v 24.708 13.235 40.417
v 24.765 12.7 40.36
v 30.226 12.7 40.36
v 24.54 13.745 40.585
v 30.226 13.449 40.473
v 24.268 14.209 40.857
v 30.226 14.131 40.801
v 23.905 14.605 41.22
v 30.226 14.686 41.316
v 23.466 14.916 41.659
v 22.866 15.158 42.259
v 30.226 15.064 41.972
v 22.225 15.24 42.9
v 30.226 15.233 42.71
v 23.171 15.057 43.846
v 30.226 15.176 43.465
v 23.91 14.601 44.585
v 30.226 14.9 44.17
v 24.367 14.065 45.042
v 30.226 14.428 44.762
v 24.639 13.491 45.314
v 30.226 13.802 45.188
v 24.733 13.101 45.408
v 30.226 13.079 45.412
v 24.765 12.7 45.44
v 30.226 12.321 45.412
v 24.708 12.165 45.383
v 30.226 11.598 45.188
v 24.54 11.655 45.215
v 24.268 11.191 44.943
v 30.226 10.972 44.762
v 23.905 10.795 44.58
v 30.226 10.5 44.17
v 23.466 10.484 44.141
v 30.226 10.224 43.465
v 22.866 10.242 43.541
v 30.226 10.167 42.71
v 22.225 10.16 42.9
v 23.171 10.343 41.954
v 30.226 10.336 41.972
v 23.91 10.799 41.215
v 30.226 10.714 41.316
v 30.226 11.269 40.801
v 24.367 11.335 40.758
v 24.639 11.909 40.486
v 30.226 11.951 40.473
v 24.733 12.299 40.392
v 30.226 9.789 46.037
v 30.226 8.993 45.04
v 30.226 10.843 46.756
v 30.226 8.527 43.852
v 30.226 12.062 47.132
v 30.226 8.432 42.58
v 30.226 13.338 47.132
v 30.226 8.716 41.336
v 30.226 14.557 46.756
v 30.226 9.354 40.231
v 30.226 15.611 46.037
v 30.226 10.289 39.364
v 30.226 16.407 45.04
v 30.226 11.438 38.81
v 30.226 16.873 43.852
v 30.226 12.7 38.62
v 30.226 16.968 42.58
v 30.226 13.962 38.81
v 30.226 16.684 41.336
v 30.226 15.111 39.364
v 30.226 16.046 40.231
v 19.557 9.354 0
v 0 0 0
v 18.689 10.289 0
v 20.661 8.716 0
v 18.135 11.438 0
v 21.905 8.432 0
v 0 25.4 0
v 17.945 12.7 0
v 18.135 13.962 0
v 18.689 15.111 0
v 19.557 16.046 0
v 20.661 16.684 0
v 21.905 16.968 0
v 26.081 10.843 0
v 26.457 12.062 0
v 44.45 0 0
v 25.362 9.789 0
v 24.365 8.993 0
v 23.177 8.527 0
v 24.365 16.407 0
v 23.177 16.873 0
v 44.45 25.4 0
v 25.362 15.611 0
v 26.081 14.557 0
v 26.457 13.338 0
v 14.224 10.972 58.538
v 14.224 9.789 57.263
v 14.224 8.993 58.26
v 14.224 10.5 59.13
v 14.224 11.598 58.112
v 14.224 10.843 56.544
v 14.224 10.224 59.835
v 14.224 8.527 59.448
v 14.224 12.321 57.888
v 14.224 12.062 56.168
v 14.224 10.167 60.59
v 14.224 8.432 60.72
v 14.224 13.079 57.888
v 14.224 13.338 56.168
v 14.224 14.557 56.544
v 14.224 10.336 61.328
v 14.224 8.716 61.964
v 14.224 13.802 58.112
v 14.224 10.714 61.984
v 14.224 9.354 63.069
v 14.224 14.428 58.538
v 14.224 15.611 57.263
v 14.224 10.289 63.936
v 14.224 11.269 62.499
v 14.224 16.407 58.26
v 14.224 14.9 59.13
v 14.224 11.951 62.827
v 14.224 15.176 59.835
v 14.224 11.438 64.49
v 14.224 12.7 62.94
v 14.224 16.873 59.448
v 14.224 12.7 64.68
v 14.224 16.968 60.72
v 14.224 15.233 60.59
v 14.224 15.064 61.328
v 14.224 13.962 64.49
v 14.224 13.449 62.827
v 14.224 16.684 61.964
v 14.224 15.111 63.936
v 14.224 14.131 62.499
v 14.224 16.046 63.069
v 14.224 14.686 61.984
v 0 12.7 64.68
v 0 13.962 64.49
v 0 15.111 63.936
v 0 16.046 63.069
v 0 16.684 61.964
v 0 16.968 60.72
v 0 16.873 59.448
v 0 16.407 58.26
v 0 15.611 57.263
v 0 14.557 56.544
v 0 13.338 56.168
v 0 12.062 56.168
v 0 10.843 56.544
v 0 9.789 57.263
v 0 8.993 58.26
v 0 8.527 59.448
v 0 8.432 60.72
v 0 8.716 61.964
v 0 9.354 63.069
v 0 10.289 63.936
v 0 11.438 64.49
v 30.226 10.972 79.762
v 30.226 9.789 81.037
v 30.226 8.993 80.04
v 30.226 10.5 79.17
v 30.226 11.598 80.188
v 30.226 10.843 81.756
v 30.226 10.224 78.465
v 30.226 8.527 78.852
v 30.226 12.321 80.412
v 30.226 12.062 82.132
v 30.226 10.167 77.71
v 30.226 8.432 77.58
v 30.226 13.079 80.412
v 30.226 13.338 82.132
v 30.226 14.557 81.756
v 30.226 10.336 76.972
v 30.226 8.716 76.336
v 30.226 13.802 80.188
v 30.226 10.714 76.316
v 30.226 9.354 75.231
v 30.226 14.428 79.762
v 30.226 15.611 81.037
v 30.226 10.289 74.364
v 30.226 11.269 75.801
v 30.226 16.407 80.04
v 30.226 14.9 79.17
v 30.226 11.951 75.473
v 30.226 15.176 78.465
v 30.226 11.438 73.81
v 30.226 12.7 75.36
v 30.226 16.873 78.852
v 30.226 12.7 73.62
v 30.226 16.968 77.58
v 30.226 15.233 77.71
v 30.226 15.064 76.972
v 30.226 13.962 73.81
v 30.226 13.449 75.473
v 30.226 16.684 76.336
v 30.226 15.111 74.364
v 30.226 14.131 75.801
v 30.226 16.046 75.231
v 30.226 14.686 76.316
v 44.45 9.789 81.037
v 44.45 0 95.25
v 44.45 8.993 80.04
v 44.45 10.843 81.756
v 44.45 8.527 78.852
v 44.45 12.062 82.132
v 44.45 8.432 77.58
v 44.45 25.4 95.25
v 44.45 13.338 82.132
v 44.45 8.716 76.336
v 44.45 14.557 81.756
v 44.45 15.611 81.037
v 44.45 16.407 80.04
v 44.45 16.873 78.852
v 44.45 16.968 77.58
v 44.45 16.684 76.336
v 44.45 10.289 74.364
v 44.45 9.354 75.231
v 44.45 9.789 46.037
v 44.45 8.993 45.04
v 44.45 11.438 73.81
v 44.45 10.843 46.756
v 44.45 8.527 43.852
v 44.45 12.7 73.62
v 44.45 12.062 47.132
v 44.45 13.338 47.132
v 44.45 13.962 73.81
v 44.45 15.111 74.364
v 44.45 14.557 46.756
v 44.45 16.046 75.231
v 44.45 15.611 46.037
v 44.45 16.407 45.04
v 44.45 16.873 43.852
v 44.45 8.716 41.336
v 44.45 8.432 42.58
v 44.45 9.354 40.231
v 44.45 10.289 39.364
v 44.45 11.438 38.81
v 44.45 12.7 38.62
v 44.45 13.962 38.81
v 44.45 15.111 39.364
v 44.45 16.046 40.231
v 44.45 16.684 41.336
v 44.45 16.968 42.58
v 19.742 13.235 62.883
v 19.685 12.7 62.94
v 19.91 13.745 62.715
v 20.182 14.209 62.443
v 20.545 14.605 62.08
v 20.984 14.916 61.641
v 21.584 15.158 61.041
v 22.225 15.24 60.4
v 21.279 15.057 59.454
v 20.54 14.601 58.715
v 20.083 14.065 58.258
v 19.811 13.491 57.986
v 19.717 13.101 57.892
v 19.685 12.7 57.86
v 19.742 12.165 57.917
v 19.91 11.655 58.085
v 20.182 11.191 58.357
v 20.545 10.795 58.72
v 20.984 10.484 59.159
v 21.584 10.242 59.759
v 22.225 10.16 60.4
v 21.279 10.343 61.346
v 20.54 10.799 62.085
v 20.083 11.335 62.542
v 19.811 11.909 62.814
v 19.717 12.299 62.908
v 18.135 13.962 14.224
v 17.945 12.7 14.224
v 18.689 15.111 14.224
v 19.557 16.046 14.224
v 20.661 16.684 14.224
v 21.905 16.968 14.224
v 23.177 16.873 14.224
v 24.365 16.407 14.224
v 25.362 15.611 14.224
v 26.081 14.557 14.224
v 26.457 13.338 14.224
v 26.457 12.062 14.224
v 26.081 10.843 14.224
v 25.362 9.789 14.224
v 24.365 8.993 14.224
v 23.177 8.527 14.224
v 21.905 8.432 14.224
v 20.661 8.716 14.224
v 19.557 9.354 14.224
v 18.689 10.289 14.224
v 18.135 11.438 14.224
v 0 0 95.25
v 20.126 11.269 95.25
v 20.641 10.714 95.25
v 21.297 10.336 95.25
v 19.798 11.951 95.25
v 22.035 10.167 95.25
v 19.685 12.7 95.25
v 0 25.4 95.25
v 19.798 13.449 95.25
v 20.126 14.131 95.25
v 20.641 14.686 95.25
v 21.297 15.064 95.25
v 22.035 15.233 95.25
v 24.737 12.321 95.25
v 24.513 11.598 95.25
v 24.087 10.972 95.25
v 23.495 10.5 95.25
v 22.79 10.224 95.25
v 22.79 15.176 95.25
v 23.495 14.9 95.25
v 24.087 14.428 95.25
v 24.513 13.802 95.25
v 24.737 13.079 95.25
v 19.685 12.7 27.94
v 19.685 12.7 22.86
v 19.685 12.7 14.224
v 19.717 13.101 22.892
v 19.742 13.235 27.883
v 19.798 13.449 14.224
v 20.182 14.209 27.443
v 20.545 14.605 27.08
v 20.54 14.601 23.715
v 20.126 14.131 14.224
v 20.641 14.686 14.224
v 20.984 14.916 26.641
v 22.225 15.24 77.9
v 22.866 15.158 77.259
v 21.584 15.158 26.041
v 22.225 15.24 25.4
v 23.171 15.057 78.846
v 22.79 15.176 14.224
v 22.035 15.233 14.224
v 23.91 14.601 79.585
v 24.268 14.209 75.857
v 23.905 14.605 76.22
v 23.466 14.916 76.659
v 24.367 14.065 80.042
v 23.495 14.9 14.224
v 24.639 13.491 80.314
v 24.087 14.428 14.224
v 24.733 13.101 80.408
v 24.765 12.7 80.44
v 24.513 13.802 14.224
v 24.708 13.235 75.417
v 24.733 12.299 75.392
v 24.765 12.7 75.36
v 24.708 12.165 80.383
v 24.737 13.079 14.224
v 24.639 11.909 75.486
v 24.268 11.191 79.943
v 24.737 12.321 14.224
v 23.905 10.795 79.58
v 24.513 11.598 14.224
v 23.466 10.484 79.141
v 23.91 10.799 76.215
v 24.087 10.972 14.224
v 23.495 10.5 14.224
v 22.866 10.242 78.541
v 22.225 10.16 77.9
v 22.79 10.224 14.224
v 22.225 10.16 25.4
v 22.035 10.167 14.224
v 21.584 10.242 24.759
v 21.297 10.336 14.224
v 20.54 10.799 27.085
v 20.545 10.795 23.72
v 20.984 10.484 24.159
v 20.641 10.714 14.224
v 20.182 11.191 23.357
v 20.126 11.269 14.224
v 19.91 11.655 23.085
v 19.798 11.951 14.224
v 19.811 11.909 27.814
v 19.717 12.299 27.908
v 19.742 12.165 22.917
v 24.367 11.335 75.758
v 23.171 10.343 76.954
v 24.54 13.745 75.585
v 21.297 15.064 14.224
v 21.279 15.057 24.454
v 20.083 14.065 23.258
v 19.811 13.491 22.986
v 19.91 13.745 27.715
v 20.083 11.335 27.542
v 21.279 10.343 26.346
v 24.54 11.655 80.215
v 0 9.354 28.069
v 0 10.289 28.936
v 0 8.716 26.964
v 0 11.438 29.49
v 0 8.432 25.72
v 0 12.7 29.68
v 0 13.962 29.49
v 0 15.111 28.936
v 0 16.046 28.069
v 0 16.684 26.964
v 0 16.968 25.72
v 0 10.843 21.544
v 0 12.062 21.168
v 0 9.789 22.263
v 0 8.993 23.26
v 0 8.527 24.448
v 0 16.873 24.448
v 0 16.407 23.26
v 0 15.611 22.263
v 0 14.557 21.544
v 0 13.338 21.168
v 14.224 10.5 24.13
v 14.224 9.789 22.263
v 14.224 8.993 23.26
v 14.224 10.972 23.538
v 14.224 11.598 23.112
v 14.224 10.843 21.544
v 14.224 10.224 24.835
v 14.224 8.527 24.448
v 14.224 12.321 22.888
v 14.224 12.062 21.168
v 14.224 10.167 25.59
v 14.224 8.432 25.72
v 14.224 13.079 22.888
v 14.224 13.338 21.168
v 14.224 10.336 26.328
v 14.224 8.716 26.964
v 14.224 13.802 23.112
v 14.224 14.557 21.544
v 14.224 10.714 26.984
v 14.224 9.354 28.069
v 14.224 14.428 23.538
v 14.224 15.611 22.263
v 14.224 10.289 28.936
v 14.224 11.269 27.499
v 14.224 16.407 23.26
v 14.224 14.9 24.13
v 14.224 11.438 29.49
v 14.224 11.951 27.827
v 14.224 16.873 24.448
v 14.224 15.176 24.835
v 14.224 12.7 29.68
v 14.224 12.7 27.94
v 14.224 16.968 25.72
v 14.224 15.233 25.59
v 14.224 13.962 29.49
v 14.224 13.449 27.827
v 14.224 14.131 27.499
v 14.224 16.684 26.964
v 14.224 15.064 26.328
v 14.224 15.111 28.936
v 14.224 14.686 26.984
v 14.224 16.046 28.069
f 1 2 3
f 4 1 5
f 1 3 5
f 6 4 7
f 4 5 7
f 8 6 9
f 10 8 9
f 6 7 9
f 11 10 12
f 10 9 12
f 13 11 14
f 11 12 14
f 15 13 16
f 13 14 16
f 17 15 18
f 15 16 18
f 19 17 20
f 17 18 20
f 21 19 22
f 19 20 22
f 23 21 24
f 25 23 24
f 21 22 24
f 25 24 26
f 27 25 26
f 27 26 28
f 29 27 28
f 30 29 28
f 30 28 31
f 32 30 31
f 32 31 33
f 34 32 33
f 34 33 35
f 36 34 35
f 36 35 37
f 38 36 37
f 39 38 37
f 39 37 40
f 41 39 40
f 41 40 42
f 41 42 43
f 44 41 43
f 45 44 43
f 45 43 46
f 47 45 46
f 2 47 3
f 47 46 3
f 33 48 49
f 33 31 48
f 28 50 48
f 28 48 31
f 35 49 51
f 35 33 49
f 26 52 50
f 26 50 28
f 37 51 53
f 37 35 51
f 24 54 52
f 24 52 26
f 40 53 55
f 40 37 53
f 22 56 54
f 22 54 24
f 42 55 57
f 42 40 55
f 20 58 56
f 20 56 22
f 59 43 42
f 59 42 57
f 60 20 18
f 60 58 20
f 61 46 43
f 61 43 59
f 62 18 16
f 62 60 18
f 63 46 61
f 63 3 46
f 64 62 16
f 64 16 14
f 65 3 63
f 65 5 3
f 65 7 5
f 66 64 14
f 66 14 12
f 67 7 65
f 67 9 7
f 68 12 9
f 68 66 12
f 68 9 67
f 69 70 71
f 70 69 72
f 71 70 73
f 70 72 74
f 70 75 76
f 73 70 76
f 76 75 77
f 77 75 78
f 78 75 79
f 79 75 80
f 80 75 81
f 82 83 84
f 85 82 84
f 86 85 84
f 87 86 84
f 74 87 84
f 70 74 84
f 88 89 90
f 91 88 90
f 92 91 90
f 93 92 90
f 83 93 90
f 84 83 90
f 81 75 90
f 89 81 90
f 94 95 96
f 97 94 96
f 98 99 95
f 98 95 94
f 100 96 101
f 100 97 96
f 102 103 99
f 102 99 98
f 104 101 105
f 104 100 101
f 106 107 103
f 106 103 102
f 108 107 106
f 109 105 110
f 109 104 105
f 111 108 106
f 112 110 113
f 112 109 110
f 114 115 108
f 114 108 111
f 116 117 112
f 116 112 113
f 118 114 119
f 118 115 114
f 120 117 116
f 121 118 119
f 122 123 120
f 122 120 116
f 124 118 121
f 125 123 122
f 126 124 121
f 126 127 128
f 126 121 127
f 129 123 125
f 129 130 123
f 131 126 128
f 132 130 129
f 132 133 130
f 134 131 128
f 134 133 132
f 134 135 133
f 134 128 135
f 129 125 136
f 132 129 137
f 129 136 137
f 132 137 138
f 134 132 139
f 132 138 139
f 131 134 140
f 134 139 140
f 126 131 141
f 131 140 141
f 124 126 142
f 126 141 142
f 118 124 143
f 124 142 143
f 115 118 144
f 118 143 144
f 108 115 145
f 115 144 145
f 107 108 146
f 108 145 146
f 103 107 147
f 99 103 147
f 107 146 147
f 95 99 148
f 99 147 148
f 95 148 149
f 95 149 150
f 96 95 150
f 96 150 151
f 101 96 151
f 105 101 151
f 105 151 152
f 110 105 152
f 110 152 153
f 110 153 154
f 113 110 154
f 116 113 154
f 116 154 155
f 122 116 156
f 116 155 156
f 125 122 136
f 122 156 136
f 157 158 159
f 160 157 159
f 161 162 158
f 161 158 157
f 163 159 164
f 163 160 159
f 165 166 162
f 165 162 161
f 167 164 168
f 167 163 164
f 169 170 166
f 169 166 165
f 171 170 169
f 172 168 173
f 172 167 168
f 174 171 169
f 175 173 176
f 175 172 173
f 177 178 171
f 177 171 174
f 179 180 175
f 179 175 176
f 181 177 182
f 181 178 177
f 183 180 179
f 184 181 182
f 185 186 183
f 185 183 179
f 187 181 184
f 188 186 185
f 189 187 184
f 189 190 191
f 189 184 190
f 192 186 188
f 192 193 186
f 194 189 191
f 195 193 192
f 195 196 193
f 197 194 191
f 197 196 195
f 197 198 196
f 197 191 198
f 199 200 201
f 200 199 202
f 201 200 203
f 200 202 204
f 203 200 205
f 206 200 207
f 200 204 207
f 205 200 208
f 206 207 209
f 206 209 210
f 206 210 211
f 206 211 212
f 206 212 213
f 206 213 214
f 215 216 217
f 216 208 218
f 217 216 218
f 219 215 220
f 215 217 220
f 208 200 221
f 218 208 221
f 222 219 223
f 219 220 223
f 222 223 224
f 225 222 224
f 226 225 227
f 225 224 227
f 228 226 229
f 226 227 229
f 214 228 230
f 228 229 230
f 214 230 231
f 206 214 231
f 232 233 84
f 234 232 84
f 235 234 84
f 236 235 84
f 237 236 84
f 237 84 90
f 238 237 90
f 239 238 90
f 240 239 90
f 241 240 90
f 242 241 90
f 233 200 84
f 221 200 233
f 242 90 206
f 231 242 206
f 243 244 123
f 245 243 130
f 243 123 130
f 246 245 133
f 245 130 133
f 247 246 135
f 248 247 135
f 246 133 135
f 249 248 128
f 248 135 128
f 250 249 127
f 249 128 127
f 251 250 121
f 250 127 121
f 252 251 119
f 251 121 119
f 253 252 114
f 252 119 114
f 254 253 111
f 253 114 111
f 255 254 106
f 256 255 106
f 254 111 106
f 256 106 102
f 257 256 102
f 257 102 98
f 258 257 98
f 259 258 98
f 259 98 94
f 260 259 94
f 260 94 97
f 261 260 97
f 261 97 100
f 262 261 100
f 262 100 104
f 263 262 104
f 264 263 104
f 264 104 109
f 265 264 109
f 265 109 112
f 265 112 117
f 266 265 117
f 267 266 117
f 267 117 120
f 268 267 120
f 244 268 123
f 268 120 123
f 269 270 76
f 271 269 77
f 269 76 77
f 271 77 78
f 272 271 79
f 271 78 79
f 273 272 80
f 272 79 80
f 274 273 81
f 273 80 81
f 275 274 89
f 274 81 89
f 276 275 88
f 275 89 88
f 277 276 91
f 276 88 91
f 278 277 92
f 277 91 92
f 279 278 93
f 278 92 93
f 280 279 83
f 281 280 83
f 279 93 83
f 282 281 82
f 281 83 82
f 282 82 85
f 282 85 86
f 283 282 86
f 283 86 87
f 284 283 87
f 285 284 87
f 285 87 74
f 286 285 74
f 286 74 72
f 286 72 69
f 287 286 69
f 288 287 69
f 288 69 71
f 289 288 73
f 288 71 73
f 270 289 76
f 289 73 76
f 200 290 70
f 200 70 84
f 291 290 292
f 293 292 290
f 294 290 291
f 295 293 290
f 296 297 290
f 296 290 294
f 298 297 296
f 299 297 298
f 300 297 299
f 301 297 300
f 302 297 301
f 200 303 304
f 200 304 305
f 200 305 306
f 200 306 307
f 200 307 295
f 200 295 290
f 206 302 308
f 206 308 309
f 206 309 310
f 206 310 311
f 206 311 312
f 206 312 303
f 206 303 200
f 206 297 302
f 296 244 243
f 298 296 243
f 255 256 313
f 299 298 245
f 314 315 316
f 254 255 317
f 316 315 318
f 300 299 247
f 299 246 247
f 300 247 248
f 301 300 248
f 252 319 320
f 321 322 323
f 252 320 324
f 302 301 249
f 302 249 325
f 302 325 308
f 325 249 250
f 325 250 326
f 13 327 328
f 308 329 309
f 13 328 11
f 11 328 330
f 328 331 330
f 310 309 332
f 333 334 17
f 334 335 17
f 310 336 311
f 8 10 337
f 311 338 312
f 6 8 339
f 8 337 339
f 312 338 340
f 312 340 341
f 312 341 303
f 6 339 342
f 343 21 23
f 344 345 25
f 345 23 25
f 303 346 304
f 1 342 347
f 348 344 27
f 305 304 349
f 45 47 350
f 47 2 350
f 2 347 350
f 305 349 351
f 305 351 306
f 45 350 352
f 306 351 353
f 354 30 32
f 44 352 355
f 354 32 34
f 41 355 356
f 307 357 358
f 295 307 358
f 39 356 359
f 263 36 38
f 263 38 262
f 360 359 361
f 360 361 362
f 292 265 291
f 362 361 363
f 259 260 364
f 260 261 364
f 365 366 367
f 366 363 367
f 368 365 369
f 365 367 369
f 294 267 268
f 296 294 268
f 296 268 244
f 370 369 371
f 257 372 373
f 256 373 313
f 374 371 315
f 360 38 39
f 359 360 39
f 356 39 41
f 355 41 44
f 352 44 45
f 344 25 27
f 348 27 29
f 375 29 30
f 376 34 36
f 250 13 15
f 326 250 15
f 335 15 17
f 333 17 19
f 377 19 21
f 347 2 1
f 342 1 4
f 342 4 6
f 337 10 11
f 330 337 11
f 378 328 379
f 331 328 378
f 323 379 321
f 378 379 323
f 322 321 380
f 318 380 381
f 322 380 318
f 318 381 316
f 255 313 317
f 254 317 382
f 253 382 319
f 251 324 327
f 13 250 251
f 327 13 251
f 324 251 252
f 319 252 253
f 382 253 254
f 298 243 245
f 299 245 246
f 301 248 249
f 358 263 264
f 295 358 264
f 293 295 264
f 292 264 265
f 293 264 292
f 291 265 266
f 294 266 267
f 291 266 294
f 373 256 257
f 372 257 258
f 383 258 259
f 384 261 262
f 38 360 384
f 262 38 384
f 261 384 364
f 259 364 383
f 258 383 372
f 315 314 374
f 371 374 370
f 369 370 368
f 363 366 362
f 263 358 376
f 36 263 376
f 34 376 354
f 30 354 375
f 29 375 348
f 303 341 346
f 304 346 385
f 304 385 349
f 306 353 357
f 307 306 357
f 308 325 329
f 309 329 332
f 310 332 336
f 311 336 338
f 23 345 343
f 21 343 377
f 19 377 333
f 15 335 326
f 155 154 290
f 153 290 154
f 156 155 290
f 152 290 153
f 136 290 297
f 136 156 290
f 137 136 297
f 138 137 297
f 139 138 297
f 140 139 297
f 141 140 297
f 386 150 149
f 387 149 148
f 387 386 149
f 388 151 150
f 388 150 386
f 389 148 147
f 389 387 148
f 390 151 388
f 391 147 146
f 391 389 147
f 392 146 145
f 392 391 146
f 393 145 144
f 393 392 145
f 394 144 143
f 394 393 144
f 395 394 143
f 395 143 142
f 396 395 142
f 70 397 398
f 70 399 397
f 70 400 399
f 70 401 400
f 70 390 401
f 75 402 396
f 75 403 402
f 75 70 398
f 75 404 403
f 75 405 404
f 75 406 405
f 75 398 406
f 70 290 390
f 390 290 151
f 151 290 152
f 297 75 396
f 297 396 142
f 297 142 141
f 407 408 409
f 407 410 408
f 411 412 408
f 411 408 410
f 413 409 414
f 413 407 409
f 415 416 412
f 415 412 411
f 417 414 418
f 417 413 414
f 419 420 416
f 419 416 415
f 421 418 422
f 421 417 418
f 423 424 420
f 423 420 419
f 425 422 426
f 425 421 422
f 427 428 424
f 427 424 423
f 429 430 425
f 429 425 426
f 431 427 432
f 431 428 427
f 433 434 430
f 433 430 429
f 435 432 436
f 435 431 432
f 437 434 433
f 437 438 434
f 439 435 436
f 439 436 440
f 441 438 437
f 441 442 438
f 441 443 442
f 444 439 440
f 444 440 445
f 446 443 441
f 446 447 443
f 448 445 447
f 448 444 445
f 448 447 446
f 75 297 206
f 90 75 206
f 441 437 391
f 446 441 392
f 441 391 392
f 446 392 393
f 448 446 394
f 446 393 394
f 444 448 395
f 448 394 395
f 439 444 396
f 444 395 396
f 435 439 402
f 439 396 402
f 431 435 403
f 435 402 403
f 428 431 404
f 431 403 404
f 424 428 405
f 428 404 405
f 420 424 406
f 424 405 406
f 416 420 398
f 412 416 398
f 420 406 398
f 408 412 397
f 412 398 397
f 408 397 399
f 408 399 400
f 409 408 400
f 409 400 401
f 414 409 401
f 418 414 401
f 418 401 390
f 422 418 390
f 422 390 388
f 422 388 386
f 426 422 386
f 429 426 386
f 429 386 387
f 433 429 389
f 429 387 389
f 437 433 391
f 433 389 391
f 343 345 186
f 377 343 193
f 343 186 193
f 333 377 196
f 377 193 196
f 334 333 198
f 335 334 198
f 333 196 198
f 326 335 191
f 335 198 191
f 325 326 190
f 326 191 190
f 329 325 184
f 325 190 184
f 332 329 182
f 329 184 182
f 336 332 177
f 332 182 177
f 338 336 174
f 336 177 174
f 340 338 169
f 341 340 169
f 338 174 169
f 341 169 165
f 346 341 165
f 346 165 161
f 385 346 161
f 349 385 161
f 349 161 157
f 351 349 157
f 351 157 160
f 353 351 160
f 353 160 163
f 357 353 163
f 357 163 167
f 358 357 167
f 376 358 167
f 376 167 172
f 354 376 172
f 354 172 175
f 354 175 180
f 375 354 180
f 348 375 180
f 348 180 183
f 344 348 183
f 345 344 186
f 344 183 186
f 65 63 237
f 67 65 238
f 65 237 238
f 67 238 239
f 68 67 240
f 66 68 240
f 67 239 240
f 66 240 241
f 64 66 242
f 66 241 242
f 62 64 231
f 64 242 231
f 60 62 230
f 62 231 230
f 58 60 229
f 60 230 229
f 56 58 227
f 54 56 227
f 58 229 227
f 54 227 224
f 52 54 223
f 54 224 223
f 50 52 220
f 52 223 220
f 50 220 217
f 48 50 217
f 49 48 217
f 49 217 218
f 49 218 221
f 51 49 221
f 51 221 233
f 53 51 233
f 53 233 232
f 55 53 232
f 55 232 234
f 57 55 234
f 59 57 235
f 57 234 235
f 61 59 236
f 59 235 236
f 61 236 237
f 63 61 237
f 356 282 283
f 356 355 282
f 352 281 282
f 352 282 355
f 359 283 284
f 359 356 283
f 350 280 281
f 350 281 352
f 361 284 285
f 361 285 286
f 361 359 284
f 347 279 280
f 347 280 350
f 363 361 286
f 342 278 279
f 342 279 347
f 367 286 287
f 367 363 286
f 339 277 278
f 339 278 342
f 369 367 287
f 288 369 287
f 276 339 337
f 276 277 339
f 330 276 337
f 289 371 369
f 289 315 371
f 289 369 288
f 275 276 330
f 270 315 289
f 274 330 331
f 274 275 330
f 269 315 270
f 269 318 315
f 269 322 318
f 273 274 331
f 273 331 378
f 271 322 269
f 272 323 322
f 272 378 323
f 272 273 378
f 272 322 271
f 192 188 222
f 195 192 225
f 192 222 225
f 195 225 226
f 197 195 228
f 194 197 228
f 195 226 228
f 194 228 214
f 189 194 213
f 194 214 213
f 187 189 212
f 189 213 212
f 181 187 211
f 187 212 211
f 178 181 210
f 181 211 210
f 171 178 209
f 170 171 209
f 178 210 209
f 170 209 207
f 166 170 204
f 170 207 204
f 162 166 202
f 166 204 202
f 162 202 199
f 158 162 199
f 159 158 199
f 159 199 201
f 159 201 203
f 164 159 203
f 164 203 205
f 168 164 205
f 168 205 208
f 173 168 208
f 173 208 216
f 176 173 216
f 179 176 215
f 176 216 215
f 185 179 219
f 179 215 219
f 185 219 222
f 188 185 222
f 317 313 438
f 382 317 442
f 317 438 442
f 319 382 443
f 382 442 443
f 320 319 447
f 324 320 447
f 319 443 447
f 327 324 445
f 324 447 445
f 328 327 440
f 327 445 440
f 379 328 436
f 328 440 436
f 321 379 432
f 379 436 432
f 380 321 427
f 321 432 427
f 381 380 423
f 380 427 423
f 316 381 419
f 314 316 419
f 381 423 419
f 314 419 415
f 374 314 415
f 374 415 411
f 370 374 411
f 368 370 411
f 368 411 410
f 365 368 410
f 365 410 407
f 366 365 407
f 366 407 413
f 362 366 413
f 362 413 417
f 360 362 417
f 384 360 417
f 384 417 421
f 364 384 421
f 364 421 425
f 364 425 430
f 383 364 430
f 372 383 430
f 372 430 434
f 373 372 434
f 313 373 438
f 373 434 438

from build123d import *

# Parameters (mm, degrees)
SKETCH1_W           = 44.45
SKETCH1_H           = 25.4
BOSS_EXTRUDE1_DEPTH = 95.25
SKETCH2_R           = 4.28
CUT_EXTRUDE1_DEPTH  = 14.224
SKETCH3_R           = 4.28
CUT_EXTRUDE2_DEPTH  = 14.224
SKETCH5_R           = 4.2799
CUT_EXTRUDE4_DEPTH  = 14.224
SKETCH6_R           = 2.54
CUT_EXTRUDE5_DEPTH  = 86.36
CUT_EXTRUDE6_REACH  = 32.226
SKETCH7_R           = 2.54
CUT_EXTRUDE7_REACH  = 32.226
SKETCH8_R           = 2.54


with BuildPart() as part:
    # Sketch1 → Boss-Extrude1 (new body)
    with BuildSketch(Plane.XY):
        with Locations((22.225, 12.7)):
            Rectangle(SKETCH1_W, SKETCH1_H)
    extrude(amount=BOSS_EXTRUDE1_DEPTH)

    # Sketch2 → Cut-Extrude1 (cut)
    with BuildSketch(Plane.ZY):
        with Locations((25.4, 12.7)):
            Circle(SKETCH2_R)
        with Locations((60.4, 12.7)):
            Circle(SKETCH2_R)
    extrude(amount=-CUT_EXTRUDE1_DEPTH, mode=Mode.SUBTRACT)

    # Sketch3 → Cut-Extrude2 (cut)
    with BuildSketch(Plane(origin=(44.45, 0, 0), x_dir=(0, 0, -1), z_dir=(1, 0, 0))):
        with Locations((-77.9, 12.7)):
            Circle(SKETCH3_R)
        with Locations((-42.9, 12.7)):
            Circle(SKETCH3_R)
    extrude(amount=-CUT_EXTRUDE2_DEPTH, mode=Mode.SUBTRACT)

    # Sketch5 → Cut-Extrude4 (cut)
    with BuildSketch(Plane(origin=(0, 0, 0), x_dir=(-1, 0, 0), z_dir=(0, 0, -1))):
        with Locations((-22.225, 12.7)):
            Circle(SKETCH5_R)
    extrude(amount=-CUT_EXTRUDE4_DEPTH, mode=Mode.SUBTRACT)

    # Sketch6 → Cut-Extrude5 (cut)
    with BuildSketch(Plane(origin=(0, 0, 14.224), x_dir=(-1, 0, 0), z_dir=(0, 0, -1))):
        with Locations((-22.225, 12.7)):
            Circle(SKETCH6_R)
    extrude(amount=-CUT_EXTRUDE5_DEPTH, mode=Mode.SUBTRACT)

    # Sketch7 → Cut-Extrude6 (cut, up to next)
    with BuildSketch(Plane(origin=(30.226, 0, 0), x_dir=(0, 0, -1), z_dir=(1, 0, 0)), mode=Mode.PRIVATE) as cut_extrude6_sk1:
        with Locations((-42.9, 12.7)):
            Circle(SKETCH7_R)
    cut_extrude6_tool1 = extrude(cut_extrude6_sk1.sketch, amount=-CUT_EXTRUDE6_REACH, mode=Mode.PRIVATE) & part.part
    add(cut_extrude6_tool1.solids().sort_by_distance((30.226, 12.7, 42.9))[0], mode=Mode.SUBTRACT)
    # Sketch7 → Cut-Extrude6 (cut, up to next)
    with BuildSketch(Plane(origin=(30.226, 0, 0), x_dir=(0, 0, -1), z_dir=(1, 0, 0)), mode=Mode.PRIVATE) as cut_extrude6_sk2:
        with Locations((-77.9, 12.7)):
            Circle(SKETCH7_R)
    cut_extrude6_tool2 = extrude(cut_extrude6_sk2.sketch, amount=-CUT_EXTRUDE6_REACH, mode=Mode.PRIVATE) & part.part
    add(cut_extrude6_tool2.solids().sort_by_distance((30.226, 12.7, 77.9))[0], mode=Mode.SUBTRACT)

    # Sketch8 → Cut-Extrude7 (cut, up to next)
    with BuildSketch(Plane.ZY.offset(-14.224), mode=Mode.PRIVATE) as cut_extrude7_sk1:
        with Locations((25.4, 12.7)):
            Circle(SKETCH8_R)
    cut_extrude7_tool1 = extrude(cut_extrude7_sk1.sketch, amount=-CUT_EXTRUDE7_REACH, mode=Mode.PRIVATE) & part.part
    add(cut_extrude7_tool1.solids().sort_by_distance((14.224, 12.7, 25.4))[0], mode=Mode.SUBTRACT)
    # Sketch8 → Cut-Extrude7 (cut, up to next)
    with BuildSketch(Plane.ZY.offset(-14.224), mode=Mode.PRIVATE) as cut_extrude7_sk2:
        with Locations((60.4, 12.7)):
            Circle(SKETCH8_R)
    cut_extrude7_tool2 = extrude(cut_extrude7_sk2.sketch, amount=-CUT_EXTRUDE7_REACH, mode=Mode.PRIVATE) & part.part
    add(cut_extrude7_tool2.solids().sort_by_distance((14.224, 12.7, 60.4))[0], mode=Mode.SUBTRACT)


solid = part.part
